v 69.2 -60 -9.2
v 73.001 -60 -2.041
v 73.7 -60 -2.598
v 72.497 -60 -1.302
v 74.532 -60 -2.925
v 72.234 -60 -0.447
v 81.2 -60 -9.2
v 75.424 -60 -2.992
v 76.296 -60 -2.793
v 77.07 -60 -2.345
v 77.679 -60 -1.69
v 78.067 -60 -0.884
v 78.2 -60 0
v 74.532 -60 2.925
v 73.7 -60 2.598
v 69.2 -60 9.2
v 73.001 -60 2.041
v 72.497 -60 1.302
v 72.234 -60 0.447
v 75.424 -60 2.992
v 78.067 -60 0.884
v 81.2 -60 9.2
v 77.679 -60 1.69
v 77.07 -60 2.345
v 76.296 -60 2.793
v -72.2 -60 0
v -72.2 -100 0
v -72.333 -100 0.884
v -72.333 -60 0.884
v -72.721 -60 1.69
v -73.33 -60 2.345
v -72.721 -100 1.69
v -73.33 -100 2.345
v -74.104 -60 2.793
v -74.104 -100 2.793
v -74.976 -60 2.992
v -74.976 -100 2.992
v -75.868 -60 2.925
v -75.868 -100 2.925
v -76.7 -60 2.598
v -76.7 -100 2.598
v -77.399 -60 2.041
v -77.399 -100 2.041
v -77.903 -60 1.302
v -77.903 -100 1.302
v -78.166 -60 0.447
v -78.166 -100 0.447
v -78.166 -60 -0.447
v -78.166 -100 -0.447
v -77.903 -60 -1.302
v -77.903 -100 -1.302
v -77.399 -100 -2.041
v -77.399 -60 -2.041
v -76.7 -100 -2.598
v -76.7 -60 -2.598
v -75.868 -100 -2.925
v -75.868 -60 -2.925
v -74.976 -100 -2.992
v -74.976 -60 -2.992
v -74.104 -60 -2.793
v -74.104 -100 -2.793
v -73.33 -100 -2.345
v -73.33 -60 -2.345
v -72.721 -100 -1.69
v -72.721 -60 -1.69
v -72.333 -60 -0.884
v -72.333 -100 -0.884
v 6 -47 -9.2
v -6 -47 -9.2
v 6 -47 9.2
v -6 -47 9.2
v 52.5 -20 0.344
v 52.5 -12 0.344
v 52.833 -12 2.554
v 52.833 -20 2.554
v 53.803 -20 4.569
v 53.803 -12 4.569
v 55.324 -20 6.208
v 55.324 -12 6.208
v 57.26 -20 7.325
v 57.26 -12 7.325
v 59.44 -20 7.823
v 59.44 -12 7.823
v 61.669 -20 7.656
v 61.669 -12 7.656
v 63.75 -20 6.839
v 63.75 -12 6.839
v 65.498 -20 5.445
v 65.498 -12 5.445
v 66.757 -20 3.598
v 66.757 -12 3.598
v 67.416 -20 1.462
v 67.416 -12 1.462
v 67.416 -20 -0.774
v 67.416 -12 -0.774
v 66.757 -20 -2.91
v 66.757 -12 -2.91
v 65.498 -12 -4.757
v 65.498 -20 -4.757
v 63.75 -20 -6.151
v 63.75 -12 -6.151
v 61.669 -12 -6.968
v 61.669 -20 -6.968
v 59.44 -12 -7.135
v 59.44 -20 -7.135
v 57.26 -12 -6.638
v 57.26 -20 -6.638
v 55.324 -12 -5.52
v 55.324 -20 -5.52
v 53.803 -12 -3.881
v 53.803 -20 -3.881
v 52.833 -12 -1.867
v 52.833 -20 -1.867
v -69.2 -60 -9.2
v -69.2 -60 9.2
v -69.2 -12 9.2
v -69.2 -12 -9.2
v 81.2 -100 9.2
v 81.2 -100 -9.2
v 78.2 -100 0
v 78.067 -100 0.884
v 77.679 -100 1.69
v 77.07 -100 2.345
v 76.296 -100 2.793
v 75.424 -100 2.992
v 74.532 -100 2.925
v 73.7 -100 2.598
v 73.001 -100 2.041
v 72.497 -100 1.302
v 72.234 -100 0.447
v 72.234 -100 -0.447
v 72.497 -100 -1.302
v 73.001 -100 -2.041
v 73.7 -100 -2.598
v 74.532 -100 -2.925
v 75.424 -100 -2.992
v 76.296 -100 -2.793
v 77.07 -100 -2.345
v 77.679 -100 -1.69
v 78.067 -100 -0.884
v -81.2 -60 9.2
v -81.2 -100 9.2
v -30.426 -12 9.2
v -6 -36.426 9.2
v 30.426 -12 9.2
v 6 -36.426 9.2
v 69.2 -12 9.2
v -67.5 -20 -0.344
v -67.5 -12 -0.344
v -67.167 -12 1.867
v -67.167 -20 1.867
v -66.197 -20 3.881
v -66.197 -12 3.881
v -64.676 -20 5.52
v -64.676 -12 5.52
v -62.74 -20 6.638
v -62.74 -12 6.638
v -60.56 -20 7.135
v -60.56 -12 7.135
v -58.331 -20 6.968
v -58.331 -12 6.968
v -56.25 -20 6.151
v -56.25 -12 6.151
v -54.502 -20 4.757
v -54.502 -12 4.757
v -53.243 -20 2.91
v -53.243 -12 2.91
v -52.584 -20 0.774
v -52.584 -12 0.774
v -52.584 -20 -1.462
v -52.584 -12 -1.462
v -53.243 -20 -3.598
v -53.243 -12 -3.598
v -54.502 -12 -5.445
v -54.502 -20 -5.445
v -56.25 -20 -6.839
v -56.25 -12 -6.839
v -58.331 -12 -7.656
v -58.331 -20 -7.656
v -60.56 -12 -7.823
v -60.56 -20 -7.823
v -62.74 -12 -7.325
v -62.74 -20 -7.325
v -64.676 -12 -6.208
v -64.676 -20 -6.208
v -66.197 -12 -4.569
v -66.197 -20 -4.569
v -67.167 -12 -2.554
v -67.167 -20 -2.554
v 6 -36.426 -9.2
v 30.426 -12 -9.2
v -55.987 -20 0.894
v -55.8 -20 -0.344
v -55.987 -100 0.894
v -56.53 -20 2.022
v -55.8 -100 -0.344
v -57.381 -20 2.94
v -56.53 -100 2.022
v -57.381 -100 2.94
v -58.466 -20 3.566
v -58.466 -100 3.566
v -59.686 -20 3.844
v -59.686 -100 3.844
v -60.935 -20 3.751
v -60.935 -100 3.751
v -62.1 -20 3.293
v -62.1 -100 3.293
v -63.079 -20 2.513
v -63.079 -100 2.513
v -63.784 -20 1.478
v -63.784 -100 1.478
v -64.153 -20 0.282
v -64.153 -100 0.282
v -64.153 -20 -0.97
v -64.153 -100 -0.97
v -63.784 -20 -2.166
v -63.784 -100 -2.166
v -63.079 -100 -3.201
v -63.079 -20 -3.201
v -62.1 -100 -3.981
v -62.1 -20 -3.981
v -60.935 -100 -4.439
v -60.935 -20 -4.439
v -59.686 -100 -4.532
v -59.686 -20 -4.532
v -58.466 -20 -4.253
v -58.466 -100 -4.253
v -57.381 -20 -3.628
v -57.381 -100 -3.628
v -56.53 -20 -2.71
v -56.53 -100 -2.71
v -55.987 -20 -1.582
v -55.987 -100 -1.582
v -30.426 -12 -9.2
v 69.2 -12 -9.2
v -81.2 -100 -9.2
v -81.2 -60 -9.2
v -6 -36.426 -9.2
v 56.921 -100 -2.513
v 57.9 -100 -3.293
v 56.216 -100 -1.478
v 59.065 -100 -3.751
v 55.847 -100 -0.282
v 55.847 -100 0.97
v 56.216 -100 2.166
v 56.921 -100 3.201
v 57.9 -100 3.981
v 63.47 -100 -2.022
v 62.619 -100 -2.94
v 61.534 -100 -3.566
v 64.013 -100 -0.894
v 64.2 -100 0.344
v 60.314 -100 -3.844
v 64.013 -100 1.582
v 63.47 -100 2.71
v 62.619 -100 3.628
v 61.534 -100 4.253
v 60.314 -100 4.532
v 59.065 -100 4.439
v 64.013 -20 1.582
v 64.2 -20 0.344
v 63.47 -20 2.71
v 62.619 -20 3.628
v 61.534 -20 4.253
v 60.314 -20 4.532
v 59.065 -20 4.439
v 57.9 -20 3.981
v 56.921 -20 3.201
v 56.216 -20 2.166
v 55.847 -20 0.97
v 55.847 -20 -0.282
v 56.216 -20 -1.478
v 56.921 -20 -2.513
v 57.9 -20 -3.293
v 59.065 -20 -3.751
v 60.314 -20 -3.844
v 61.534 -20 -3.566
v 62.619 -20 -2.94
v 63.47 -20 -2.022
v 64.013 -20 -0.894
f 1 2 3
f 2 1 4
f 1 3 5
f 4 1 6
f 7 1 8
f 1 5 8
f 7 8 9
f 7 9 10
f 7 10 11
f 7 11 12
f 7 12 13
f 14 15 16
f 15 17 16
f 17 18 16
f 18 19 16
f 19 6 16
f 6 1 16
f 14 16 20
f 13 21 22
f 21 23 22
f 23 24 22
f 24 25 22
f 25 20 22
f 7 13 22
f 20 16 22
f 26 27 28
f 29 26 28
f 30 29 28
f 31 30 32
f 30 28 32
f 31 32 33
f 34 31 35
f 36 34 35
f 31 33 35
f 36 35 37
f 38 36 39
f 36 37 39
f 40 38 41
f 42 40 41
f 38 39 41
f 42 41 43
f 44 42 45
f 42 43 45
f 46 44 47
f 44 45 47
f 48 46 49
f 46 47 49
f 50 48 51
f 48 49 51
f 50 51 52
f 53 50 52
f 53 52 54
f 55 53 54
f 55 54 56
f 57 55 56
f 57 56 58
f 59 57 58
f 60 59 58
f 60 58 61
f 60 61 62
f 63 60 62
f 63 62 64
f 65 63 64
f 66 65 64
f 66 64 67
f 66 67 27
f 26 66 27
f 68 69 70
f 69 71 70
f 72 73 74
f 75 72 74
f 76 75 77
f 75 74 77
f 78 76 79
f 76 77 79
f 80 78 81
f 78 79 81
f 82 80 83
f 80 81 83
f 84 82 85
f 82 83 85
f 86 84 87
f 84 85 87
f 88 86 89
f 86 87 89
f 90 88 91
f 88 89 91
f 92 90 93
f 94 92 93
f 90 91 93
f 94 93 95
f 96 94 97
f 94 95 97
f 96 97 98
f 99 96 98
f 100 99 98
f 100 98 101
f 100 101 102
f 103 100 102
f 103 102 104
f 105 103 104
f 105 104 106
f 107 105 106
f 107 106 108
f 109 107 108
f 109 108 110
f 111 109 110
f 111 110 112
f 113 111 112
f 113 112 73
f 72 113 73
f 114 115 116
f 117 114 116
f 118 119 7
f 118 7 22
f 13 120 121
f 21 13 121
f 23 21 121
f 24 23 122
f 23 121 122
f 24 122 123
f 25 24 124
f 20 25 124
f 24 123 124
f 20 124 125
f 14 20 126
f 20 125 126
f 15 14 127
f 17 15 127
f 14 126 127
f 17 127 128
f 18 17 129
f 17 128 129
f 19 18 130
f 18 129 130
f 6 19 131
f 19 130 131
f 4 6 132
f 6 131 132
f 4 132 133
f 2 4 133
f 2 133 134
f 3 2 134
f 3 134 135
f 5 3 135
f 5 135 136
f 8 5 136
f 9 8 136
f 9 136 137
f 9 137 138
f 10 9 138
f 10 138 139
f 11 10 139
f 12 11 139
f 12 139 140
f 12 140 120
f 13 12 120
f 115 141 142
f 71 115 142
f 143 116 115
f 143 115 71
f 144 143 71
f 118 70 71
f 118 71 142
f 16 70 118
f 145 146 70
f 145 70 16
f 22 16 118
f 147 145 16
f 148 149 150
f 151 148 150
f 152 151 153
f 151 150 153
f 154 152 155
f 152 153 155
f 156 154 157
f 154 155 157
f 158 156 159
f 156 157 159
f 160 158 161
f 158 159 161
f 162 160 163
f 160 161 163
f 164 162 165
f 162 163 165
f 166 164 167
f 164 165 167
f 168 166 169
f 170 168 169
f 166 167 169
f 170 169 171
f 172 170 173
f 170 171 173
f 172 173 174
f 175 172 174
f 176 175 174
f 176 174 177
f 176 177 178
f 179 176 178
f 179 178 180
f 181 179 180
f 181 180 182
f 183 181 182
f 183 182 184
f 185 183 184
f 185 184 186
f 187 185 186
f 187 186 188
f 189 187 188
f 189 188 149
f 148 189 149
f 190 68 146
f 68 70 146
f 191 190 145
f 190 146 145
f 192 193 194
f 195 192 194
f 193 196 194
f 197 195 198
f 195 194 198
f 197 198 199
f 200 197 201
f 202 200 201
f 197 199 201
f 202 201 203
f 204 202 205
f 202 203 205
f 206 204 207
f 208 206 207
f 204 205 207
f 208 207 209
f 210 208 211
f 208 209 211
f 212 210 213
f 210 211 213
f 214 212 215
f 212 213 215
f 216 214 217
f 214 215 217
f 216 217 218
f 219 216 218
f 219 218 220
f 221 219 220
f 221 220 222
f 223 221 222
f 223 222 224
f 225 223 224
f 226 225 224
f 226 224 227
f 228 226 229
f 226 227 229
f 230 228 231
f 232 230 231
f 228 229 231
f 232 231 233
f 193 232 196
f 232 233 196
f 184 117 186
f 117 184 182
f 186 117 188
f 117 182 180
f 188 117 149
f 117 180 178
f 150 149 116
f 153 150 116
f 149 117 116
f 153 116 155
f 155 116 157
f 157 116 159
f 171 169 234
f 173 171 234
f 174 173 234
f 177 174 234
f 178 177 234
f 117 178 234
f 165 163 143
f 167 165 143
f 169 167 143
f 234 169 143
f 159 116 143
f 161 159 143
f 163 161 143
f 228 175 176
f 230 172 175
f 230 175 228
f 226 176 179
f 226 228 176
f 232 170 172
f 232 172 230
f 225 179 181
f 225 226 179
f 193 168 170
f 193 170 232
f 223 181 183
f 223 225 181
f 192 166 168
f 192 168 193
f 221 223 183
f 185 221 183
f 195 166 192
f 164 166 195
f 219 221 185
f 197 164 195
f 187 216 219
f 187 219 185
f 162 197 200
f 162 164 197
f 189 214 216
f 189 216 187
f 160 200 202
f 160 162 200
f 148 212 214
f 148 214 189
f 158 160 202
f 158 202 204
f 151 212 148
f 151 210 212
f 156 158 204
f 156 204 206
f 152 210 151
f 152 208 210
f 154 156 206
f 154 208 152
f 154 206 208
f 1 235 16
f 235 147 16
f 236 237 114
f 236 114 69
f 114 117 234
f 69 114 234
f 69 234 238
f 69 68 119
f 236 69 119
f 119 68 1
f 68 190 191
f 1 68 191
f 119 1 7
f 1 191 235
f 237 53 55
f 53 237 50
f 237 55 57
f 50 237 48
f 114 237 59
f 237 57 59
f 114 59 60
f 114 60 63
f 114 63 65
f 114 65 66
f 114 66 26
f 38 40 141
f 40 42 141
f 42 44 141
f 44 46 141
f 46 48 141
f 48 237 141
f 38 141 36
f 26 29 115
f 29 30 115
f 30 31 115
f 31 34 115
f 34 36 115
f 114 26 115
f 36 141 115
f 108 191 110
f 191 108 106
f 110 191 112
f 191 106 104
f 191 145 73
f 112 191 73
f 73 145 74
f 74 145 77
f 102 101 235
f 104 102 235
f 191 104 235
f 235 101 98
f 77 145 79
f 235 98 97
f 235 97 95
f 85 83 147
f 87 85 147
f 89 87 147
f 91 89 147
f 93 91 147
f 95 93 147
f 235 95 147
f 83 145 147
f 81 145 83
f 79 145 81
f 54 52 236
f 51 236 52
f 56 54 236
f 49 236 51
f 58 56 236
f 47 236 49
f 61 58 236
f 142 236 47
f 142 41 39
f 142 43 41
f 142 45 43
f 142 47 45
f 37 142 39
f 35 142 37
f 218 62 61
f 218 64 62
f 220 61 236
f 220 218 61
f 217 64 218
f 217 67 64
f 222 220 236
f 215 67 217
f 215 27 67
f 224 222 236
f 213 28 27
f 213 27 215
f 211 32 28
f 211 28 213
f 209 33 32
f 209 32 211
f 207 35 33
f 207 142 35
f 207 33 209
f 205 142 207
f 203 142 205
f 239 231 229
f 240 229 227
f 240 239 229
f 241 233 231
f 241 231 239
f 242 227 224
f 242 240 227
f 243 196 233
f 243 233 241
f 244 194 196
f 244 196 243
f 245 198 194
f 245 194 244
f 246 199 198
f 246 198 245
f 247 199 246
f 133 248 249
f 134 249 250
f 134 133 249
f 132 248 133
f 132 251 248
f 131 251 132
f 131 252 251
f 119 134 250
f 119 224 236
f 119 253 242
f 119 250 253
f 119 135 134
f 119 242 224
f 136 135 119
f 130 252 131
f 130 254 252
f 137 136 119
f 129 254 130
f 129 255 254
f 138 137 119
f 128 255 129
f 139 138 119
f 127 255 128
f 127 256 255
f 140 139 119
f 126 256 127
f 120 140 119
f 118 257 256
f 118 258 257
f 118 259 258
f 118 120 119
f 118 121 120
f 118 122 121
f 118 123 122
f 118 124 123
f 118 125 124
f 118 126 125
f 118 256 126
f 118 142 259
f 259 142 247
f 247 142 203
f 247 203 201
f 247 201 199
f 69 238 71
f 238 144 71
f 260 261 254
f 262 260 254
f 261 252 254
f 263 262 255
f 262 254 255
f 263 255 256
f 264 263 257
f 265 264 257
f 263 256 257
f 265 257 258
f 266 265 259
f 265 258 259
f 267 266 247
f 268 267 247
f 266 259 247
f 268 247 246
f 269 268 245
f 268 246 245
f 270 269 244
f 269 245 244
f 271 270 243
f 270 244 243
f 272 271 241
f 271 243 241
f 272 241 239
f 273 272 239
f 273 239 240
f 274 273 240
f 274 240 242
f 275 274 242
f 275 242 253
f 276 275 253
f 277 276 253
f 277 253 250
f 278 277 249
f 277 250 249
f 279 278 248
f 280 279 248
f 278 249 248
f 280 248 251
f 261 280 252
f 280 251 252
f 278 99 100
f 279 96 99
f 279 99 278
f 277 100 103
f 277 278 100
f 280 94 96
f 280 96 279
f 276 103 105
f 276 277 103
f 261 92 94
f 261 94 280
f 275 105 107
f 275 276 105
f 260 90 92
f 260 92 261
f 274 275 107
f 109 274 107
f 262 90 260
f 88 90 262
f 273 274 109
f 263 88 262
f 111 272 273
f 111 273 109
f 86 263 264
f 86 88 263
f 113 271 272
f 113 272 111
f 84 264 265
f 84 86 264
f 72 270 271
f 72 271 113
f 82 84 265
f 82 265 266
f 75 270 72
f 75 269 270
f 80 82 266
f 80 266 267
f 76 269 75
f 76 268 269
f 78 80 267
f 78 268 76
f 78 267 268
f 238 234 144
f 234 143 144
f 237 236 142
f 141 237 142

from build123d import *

# Parameters (mm, degrees)
EXTRUDE_1_DEPTH             = 9.2
SKETCH_2_W                  = 162.4
SKETCH_2_H                  = 18.4
EXTRUDE_2_DEPTH             = 40
HOLE_WIZARD_M82_D           = 8.4
HOLE_WIZARD_M82_CBORE_D     = 15
HOLE_WIZARD_M82_CBORE_DEPTH = 8
HOLE_WIZARD_6_0_6_2_D       = 6


with BuildPart() as part:
    # Эскиз1 → Бобышка-Вытянуть1 (new, symmetric)
    with BuildSketch(Plane.XY):
        Polygon((-69.2, -12), (-30.426406871, -12), (-6, -36.426406871), (-6, -47), (6, -47), (6, -36.426406871), (30.426406871, -12), (69.2, -12), (69.2, -60), (-69.2, -60), align=None)
    extrude(amount=EXTRUDE_1_DEPTH, both=True)

    # Эскиз2 → Бобышка-Вытянуть2 (add)
    with BuildSketch(Plane.XZ.offset(60)):
        Rectangle(SKETCH_2_W, SKETCH_2_H)
    extrude(amount=EXTRUDE_2_DEPTH)

    # Цековка для винта с внутренним шестигранником M82 (through all)
    with Locations(Plane(origin=(0, -12, 0), x_dir=(-1, 0, 0), z_dir=(0, 1, 0))):
        with Locations((-60, 0.343824936), (60, -0.343824936)):
            CounterBoreHole(HOLE_WIZARD_M82_D / 2, HOLE_WIZARD_M82_CBORE_D / 2, HOLE_WIZARD_M82_CBORE_DEPTH)

    # Диаметр отверстия Ø6.0 (6)2 (through all)
    with Locations(Plane(origin=(0, -60, 0), x_dir=(-1, 0, 0), z_dir=(0, 1, 0))):
        with Locations((-75.2, 0), (75.2, 0)):
            Hole(HOLE_WIZARD_6_0_6_2_D / 2)


solid = part.part
